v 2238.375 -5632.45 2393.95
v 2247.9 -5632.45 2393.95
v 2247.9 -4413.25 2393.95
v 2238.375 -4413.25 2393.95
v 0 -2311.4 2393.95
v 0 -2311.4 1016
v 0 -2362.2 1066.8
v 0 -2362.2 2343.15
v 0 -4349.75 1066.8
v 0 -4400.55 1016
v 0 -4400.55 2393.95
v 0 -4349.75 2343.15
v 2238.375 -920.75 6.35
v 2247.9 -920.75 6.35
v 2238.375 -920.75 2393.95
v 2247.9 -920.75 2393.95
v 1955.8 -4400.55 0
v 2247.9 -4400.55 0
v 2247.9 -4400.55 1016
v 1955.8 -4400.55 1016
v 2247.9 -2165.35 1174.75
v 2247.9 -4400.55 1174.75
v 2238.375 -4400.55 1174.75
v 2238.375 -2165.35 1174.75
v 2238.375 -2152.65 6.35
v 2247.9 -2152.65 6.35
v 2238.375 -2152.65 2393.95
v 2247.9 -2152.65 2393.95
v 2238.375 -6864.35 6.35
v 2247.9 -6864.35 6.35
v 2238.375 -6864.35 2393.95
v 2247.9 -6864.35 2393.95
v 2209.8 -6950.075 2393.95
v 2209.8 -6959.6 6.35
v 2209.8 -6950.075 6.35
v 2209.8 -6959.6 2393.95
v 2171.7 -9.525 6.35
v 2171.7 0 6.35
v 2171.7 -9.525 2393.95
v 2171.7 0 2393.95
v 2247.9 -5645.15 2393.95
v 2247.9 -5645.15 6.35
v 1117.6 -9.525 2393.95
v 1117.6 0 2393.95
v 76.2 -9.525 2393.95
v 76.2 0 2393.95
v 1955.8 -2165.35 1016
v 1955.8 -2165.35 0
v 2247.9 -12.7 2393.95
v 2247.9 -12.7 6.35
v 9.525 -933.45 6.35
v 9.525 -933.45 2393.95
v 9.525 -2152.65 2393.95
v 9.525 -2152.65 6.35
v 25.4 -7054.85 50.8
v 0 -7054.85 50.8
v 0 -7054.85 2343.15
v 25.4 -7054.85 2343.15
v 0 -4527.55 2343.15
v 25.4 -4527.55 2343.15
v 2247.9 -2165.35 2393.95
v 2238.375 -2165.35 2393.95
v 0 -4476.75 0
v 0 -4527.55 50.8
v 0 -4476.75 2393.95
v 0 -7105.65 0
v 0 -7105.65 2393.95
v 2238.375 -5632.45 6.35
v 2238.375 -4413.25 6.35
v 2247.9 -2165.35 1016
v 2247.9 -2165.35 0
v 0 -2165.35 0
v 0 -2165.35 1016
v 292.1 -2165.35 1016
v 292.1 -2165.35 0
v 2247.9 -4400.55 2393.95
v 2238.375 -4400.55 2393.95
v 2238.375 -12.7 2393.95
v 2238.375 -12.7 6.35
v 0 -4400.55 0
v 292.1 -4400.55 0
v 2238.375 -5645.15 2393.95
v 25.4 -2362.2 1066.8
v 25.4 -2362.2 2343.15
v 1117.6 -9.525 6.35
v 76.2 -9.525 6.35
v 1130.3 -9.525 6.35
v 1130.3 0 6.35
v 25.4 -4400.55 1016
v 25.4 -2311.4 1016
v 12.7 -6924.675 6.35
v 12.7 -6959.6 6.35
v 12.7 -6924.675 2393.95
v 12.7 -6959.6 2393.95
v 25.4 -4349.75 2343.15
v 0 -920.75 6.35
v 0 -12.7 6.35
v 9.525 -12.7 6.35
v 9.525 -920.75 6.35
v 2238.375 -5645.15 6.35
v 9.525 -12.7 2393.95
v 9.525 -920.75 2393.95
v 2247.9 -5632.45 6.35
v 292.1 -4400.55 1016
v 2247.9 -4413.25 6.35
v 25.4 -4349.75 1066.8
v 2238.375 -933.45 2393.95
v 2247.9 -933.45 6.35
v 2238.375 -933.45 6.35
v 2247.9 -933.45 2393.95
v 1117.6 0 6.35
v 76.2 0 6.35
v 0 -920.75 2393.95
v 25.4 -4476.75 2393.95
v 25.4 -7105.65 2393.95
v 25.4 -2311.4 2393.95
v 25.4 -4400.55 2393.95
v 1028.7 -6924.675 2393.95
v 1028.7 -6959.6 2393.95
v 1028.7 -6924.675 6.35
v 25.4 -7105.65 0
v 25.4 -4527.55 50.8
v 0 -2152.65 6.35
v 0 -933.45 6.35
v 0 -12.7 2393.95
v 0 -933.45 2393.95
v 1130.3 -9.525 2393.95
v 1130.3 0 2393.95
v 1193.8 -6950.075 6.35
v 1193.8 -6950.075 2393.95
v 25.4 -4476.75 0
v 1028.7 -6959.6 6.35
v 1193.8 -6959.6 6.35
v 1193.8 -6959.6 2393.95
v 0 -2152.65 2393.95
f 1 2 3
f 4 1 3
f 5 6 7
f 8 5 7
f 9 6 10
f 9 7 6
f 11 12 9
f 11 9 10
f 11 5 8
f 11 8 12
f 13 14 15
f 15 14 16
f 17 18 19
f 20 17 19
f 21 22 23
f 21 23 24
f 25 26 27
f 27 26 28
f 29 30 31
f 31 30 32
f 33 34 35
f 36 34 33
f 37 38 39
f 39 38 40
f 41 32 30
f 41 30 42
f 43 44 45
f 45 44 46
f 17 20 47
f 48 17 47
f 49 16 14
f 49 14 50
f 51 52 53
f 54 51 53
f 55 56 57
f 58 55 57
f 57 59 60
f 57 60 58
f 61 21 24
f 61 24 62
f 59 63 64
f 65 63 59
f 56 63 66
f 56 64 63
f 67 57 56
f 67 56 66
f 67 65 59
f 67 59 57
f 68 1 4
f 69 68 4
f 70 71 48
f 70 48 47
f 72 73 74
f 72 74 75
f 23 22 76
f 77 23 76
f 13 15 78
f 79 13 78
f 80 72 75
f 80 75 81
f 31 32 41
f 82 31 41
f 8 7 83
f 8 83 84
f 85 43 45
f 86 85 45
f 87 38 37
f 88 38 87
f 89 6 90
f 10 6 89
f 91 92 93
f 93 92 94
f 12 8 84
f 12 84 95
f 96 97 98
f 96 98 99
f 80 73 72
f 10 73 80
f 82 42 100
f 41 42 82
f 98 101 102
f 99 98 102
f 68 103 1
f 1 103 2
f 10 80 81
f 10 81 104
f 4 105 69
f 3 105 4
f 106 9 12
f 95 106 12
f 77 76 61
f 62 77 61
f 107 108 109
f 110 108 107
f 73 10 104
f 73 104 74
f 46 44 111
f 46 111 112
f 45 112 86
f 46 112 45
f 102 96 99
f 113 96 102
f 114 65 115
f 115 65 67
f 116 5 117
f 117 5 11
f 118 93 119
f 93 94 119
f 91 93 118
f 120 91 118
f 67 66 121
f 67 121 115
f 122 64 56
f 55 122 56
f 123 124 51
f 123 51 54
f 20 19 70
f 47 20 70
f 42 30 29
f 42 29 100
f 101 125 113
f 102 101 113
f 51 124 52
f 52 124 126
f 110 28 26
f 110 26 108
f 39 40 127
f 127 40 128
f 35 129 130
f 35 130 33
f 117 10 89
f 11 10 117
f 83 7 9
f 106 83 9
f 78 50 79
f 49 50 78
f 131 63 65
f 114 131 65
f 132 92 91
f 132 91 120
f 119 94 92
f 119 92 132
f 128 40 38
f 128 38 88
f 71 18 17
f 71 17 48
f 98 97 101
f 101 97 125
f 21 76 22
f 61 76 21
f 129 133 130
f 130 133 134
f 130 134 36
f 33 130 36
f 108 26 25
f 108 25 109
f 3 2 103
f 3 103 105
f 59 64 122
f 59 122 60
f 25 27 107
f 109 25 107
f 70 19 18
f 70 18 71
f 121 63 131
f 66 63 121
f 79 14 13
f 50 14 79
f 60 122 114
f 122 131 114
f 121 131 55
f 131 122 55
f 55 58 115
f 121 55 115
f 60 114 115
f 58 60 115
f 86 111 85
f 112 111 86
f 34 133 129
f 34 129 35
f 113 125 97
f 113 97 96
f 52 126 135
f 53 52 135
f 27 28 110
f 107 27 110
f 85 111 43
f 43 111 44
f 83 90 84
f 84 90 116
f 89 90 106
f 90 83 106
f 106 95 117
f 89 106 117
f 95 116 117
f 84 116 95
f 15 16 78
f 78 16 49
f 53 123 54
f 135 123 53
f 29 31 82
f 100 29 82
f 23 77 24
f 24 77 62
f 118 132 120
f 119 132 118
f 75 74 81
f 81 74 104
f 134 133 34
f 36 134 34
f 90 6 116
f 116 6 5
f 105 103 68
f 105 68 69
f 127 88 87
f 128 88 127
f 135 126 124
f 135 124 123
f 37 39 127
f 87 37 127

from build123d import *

# Parameters (mm, degrees)
F0_W      = 2247.9
F0_H      = 6959.6
F1_DEPTH  = 2565.4
F6_W      = 1219.2
F6_H      = 2387.6
F7_DEPTH  = 9.525
F6_W_2    = 2235.2
F6_H_2    = 1219.2
F6_W_3    = 908.05
F6_H_3    = 1016
F10_DEPTH = 292.1
F8_W      = 2628.9
F8_H      = 2393.95
F12_DEPTH = 25.4
F8_W_2    = 2089.15
F8_H_2    = 1377.95
F13_DEPTH = 292.1
F8_W_3    = 1219.2
F8_H_3    = 2387.6
F14_DEPTH = 9.525
F8_W_4    = 908.05
F9_W      = 1041.4
F9_H      = 2387.6
F15_DEPTH = 9.525
F11_W     = 1016
F11_H     = 2387.6
F16_DEPTH = 9.525
F18_DEPTH = 25.4
F19_W     = 2527.3
F19_H     = 2292.35
F20_DEPTH = 127
F21_W     = 1987.55
F21_H     = 1276.35
F22_DEPTH = 127


with BuildPart() as f1:
    # F0 (on Top) → F1 (new body)
    with BuildSketch(Plane.XY):
        with Locations((1123.95, -3479.8)):
            Rectangle(F0_W, F0_H)
    extrude(amount=F1_DEPTH)


with BuildPart() as f7:
    # F6 (on offset) → F7 (new body)
    with BuildSketch(Plane.YZ.offset(2247.9)):
        with Locations((-5022.85, 1200.15)):
            Rectangle(F6_W, F6_H)
    extrude(amount=-F7_DEPTH)


with BuildPart() as f7b:
    # F6 (on offset) → F7, piece 2 (new body)
    with BuildSketch(Plane.YZ.offset(2247.9)):
        with Locations((-3282.95, 1784.35)):
            Rectangle(F6_W_2, F6_H_2)
    extrude(amount=-F7_DEPTH)


with BuildPart() as f7c:
    # F6 (on offset) → F7, piece 3 (new body)
    with BuildSketch(Plane.YZ.offset(2247.9)):
        with Locations((-1543.05, 1200.15)):
            Rectangle(F6_W, F6_H)
    extrude(amount=-F7_DEPTH)


with BuildPart() as f7d:
    # F6 (on offset) → F7, piece 4 (new body)
    with BuildSketch(Plane.YZ.offset(2247.9)):
        with Locations((-6254.75, 1200.15)):
            Rectangle(F6_W, F6_H)
    extrude(amount=-F7_DEPTH)


with BuildPart() as f7e:
    # F6 (on offset) → F7, piece 5 (new body)
    with BuildSketch(Plane.YZ.offset(2247.9)):
        with Locations((-466.725, 1200.15)):
            Rectangle(F6_W_3, F6_H)
    extrude(amount=-F7_DEPTH)


with BuildPart() as f10:
    # F6 (on offset) → F10 (new body)
    with BuildSketch(Plane.YZ.offset(2247.9)):
        with Locations((-3282.95, 508)):
            Rectangle(F6_W_2, F6_H_3)
    extrude(amount=-F10_DEPTH)


with BuildPart() as f12:
    # F8 (on offset) → F12 (new body)
    with BuildSketch(Plane(origin=(0, 0, 0), x_dir=(0, -1, 0), z_dir=(-1, 0, 0))):
        with Locations((5791.2, 1196.975)):
            Rectangle(F8_W, F8_H)
    extrude(amount=-F12_DEPTH)

    # F19 (on face) → F20 (cut)
    with BuildSketch(Plane(origin=(0, 0, 0), x_dir=(0, -1, 0), z_dir=(-1, 0, 0))):
        with Locations((5791.2, 1196.975)):
            Rectangle(F19_W, F19_H)
    extrude(amount=-F20_DEPTH, mode=Mode.SUBTRACT)


with BuildPart() as f12b:
    # F8 (on offset) → F12, piece 2 (new body)
    with BuildSketch(Plane(origin=(0, 0, 0), x_dir=(0, -1, 0), z_dir=(-1, 0, 0))):
        with Locations((3355.975, 1704.975)):
            Rectangle(F8_W_2, F8_H_2)
    extrude(amount=-F12_DEPTH)

    # F21 (on face) → F22 (cut)
    with BuildSketch(Plane(origin=(0, 0, 0), x_dir=(0, -1, 0), z_dir=(-1, 0, 0))):
        with Locations((3355.975, 1704.975)):
            Rectangle(F21_W, F21_H)
    extrude(amount=-F22_DEPTH, mode=Mode.SUBTRACT)


with BuildPart() as f13:
    # F8 (on offset) → F13 (new body)
    with BuildSketch(Plane(origin=(0, 0, 0), x_dir=(0, -1, 0), z_dir=(-1, 0, 0))):
        Polygon((4400.55, 0), (4400.55, 1016), (2311.4, 1016), (2165.35, 1016), (2165.35, 0), align=None)
    extrude(amount=-F13_DEPTH)


with BuildPart() as f14:
    # F8 (on offset) → F14 (new body)
    with BuildSketch(Plane(origin=(0, 0, 0), x_dir=(0, -1, 0), z_dir=(-1, 0, 0))):
        with Locations((1543.05, 1200.15)):
            Rectangle(F8_W_3, F8_H_3)
    extrude(amount=-F14_DEPTH)


with BuildPart() as f14b:
    # F8 (on offset) → F14, piece 2 (new body)
    with BuildSketch(Plane(origin=(0, 0, 0), x_dir=(0, -1, 0), z_dir=(-1, 0, 0))):
        with Locations((466.725, 1200.15)):
            Rectangle(F8_W_4, F8_H_3)
    extrude(amount=-F14_DEPTH)


with BuildPart() as f15:
    # F9 (on offset) → F15 (new body)
    with BuildSketch(Plane(origin=(0, 0, 0), x_dir=(-1, 0, 0), z_dir=(0, 1, 0))):
        with Locations((-596.9, 1200.15)):
            Rectangle(F9_W, F9_H)
    extrude(amount=-F15_DEPTH)


with BuildPart() as f15b:
    # F9 (on offset) → F15, piece 2 (new body)
    with BuildSketch(Plane(origin=(0, 0, 0), x_dir=(-1, 0, 0), z_dir=(0, 1, 0))):
        with Locations((-1651, 1200.15)):
            Rectangle(F9_W, F9_H)
    extrude(amount=-F15_DEPTH)


with BuildPart() as f16:
    # F11 (on offset) → F16 (new body)
    with BuildSketch(Plane.XZ.offset(6959.6)):
        with Locations((520.7, 1200.15)):
            Rectangle(F11_W, F11_H)
    extrude(amount=-F16_DEPTH)

    # F18 (add): a face of the model
    f18_faces = [f16.faces().sort_by_distance(p)[0] for p in [
        (520.7, -6950.075, 1200.15),
    ]]
    extrude(f18_faces, amount=F18_DEPTH)


with BuildPart() as f16b:
    # F11 (on offset) → F16, piece 2 (new body)
    with BuildSketch(Plane.XZ.offset(6959.6)):
        with Locations((1701.8, 1200.15)):
            Rectangle(F11_W, F11_H)
    extrude(amount=-F16_DEPTH)


solid = Compound([f7.part, f7b.part, f7c.part, f7d.part, f7e.part, f10.part, f12.part, f12b.part, f13.part, f14.part, f14b.part, f15.part, f15b.part, f16.part, f16b.part])
